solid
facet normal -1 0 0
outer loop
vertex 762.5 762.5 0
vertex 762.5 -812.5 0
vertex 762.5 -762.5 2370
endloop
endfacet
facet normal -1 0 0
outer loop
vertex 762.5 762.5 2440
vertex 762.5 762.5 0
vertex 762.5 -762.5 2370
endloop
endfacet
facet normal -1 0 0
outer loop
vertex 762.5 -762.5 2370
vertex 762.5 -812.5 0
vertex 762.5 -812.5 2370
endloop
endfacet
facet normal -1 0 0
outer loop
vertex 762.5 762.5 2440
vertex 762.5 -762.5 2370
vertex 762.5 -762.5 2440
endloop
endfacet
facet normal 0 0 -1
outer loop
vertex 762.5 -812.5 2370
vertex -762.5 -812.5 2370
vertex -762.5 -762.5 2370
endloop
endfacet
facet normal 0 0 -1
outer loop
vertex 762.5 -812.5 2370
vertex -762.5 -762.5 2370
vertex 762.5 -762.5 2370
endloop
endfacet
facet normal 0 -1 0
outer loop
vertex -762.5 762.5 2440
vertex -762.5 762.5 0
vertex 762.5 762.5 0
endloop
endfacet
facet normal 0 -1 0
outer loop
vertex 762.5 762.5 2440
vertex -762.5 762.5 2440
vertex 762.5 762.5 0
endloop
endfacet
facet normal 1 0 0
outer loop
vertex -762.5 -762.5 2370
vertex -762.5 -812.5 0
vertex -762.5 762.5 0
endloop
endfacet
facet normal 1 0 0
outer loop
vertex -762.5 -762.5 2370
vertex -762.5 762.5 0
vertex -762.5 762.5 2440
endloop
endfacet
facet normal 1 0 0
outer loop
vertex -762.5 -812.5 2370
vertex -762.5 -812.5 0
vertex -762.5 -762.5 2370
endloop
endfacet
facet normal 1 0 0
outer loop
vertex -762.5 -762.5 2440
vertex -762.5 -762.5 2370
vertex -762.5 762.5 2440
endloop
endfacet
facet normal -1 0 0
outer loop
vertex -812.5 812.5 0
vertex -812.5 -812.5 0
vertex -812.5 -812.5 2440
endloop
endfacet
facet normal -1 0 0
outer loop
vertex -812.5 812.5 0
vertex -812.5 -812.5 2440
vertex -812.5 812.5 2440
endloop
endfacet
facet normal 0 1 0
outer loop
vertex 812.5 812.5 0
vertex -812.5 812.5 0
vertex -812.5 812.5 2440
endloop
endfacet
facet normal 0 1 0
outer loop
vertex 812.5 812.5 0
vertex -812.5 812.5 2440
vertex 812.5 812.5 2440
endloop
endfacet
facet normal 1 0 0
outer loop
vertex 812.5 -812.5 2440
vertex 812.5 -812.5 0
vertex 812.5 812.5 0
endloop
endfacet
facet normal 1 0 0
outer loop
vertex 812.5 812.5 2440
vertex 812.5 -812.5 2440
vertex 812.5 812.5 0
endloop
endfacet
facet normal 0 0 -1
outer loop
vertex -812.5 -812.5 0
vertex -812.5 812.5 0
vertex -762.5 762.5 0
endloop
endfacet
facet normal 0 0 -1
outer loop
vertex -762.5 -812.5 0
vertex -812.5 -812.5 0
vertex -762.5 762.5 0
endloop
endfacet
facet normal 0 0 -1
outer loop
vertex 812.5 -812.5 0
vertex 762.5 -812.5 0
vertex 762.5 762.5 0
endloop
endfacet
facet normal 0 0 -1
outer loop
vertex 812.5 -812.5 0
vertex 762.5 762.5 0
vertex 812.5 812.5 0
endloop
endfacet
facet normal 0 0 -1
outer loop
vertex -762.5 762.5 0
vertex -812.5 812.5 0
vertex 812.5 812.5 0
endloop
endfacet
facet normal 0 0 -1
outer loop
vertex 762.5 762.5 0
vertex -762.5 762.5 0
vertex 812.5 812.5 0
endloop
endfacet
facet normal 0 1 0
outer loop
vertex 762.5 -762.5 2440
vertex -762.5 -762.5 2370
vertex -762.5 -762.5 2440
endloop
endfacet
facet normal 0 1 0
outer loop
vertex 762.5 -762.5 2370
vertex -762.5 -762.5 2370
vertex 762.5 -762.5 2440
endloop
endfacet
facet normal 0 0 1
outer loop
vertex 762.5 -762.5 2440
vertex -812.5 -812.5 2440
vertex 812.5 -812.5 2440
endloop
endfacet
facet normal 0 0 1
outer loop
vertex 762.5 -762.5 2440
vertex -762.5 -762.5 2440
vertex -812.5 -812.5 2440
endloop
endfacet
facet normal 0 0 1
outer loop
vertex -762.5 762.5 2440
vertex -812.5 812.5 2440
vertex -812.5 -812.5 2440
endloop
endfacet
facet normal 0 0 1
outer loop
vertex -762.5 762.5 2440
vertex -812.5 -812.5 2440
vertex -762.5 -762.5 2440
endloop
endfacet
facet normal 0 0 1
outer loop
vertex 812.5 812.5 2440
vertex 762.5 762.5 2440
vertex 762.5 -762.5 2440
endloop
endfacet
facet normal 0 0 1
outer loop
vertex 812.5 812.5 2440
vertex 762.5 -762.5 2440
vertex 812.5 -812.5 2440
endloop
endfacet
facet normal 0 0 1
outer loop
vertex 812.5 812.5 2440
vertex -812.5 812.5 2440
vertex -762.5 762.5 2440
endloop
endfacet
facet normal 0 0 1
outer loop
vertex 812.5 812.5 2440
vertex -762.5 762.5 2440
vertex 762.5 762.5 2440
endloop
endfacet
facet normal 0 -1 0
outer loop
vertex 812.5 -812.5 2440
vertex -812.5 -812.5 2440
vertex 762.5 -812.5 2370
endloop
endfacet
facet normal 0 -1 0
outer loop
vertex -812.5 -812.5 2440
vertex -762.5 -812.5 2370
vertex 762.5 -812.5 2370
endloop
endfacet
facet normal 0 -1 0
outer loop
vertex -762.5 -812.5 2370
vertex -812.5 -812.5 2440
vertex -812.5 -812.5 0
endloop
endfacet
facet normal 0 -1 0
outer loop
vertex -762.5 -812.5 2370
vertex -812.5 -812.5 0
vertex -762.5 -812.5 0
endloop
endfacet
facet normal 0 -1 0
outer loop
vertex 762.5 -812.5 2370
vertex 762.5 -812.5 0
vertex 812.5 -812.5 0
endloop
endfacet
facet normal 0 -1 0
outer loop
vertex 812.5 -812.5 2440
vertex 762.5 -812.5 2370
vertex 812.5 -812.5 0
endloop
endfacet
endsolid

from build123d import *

# Parameters (mm, degrees)
F0_W     = 1625
F0_H     = 1625
F0_W_2   = 1525
F0_H_2   = 1525
F1_DEPTH = 2440
F2_W     = 1525
F2_H     = 2370
F3_DEPTH = 164


with BuildPart() as f1:
    # F0 (on Top) → F1 (new body)
    with BuildSketch(Plane.XY):
        Rectangle(F0_W, F0_H)
        Rectangle(F0_W_2, F0_H_2, mode=Mode.SUBTRACT)
    extrude(amount=F1_DEPTH)

    # F2 (on face) → F3 (cut)
    with BuildSketch(Plane.XZ.offset(812.5)):
        with Locations((0, 1185)):
            Rectangle(F2_W, F2_H)
    extrude(amount=-F3_DEPTH, mode=Mode.SUBTRACT)


solid = f1.part
